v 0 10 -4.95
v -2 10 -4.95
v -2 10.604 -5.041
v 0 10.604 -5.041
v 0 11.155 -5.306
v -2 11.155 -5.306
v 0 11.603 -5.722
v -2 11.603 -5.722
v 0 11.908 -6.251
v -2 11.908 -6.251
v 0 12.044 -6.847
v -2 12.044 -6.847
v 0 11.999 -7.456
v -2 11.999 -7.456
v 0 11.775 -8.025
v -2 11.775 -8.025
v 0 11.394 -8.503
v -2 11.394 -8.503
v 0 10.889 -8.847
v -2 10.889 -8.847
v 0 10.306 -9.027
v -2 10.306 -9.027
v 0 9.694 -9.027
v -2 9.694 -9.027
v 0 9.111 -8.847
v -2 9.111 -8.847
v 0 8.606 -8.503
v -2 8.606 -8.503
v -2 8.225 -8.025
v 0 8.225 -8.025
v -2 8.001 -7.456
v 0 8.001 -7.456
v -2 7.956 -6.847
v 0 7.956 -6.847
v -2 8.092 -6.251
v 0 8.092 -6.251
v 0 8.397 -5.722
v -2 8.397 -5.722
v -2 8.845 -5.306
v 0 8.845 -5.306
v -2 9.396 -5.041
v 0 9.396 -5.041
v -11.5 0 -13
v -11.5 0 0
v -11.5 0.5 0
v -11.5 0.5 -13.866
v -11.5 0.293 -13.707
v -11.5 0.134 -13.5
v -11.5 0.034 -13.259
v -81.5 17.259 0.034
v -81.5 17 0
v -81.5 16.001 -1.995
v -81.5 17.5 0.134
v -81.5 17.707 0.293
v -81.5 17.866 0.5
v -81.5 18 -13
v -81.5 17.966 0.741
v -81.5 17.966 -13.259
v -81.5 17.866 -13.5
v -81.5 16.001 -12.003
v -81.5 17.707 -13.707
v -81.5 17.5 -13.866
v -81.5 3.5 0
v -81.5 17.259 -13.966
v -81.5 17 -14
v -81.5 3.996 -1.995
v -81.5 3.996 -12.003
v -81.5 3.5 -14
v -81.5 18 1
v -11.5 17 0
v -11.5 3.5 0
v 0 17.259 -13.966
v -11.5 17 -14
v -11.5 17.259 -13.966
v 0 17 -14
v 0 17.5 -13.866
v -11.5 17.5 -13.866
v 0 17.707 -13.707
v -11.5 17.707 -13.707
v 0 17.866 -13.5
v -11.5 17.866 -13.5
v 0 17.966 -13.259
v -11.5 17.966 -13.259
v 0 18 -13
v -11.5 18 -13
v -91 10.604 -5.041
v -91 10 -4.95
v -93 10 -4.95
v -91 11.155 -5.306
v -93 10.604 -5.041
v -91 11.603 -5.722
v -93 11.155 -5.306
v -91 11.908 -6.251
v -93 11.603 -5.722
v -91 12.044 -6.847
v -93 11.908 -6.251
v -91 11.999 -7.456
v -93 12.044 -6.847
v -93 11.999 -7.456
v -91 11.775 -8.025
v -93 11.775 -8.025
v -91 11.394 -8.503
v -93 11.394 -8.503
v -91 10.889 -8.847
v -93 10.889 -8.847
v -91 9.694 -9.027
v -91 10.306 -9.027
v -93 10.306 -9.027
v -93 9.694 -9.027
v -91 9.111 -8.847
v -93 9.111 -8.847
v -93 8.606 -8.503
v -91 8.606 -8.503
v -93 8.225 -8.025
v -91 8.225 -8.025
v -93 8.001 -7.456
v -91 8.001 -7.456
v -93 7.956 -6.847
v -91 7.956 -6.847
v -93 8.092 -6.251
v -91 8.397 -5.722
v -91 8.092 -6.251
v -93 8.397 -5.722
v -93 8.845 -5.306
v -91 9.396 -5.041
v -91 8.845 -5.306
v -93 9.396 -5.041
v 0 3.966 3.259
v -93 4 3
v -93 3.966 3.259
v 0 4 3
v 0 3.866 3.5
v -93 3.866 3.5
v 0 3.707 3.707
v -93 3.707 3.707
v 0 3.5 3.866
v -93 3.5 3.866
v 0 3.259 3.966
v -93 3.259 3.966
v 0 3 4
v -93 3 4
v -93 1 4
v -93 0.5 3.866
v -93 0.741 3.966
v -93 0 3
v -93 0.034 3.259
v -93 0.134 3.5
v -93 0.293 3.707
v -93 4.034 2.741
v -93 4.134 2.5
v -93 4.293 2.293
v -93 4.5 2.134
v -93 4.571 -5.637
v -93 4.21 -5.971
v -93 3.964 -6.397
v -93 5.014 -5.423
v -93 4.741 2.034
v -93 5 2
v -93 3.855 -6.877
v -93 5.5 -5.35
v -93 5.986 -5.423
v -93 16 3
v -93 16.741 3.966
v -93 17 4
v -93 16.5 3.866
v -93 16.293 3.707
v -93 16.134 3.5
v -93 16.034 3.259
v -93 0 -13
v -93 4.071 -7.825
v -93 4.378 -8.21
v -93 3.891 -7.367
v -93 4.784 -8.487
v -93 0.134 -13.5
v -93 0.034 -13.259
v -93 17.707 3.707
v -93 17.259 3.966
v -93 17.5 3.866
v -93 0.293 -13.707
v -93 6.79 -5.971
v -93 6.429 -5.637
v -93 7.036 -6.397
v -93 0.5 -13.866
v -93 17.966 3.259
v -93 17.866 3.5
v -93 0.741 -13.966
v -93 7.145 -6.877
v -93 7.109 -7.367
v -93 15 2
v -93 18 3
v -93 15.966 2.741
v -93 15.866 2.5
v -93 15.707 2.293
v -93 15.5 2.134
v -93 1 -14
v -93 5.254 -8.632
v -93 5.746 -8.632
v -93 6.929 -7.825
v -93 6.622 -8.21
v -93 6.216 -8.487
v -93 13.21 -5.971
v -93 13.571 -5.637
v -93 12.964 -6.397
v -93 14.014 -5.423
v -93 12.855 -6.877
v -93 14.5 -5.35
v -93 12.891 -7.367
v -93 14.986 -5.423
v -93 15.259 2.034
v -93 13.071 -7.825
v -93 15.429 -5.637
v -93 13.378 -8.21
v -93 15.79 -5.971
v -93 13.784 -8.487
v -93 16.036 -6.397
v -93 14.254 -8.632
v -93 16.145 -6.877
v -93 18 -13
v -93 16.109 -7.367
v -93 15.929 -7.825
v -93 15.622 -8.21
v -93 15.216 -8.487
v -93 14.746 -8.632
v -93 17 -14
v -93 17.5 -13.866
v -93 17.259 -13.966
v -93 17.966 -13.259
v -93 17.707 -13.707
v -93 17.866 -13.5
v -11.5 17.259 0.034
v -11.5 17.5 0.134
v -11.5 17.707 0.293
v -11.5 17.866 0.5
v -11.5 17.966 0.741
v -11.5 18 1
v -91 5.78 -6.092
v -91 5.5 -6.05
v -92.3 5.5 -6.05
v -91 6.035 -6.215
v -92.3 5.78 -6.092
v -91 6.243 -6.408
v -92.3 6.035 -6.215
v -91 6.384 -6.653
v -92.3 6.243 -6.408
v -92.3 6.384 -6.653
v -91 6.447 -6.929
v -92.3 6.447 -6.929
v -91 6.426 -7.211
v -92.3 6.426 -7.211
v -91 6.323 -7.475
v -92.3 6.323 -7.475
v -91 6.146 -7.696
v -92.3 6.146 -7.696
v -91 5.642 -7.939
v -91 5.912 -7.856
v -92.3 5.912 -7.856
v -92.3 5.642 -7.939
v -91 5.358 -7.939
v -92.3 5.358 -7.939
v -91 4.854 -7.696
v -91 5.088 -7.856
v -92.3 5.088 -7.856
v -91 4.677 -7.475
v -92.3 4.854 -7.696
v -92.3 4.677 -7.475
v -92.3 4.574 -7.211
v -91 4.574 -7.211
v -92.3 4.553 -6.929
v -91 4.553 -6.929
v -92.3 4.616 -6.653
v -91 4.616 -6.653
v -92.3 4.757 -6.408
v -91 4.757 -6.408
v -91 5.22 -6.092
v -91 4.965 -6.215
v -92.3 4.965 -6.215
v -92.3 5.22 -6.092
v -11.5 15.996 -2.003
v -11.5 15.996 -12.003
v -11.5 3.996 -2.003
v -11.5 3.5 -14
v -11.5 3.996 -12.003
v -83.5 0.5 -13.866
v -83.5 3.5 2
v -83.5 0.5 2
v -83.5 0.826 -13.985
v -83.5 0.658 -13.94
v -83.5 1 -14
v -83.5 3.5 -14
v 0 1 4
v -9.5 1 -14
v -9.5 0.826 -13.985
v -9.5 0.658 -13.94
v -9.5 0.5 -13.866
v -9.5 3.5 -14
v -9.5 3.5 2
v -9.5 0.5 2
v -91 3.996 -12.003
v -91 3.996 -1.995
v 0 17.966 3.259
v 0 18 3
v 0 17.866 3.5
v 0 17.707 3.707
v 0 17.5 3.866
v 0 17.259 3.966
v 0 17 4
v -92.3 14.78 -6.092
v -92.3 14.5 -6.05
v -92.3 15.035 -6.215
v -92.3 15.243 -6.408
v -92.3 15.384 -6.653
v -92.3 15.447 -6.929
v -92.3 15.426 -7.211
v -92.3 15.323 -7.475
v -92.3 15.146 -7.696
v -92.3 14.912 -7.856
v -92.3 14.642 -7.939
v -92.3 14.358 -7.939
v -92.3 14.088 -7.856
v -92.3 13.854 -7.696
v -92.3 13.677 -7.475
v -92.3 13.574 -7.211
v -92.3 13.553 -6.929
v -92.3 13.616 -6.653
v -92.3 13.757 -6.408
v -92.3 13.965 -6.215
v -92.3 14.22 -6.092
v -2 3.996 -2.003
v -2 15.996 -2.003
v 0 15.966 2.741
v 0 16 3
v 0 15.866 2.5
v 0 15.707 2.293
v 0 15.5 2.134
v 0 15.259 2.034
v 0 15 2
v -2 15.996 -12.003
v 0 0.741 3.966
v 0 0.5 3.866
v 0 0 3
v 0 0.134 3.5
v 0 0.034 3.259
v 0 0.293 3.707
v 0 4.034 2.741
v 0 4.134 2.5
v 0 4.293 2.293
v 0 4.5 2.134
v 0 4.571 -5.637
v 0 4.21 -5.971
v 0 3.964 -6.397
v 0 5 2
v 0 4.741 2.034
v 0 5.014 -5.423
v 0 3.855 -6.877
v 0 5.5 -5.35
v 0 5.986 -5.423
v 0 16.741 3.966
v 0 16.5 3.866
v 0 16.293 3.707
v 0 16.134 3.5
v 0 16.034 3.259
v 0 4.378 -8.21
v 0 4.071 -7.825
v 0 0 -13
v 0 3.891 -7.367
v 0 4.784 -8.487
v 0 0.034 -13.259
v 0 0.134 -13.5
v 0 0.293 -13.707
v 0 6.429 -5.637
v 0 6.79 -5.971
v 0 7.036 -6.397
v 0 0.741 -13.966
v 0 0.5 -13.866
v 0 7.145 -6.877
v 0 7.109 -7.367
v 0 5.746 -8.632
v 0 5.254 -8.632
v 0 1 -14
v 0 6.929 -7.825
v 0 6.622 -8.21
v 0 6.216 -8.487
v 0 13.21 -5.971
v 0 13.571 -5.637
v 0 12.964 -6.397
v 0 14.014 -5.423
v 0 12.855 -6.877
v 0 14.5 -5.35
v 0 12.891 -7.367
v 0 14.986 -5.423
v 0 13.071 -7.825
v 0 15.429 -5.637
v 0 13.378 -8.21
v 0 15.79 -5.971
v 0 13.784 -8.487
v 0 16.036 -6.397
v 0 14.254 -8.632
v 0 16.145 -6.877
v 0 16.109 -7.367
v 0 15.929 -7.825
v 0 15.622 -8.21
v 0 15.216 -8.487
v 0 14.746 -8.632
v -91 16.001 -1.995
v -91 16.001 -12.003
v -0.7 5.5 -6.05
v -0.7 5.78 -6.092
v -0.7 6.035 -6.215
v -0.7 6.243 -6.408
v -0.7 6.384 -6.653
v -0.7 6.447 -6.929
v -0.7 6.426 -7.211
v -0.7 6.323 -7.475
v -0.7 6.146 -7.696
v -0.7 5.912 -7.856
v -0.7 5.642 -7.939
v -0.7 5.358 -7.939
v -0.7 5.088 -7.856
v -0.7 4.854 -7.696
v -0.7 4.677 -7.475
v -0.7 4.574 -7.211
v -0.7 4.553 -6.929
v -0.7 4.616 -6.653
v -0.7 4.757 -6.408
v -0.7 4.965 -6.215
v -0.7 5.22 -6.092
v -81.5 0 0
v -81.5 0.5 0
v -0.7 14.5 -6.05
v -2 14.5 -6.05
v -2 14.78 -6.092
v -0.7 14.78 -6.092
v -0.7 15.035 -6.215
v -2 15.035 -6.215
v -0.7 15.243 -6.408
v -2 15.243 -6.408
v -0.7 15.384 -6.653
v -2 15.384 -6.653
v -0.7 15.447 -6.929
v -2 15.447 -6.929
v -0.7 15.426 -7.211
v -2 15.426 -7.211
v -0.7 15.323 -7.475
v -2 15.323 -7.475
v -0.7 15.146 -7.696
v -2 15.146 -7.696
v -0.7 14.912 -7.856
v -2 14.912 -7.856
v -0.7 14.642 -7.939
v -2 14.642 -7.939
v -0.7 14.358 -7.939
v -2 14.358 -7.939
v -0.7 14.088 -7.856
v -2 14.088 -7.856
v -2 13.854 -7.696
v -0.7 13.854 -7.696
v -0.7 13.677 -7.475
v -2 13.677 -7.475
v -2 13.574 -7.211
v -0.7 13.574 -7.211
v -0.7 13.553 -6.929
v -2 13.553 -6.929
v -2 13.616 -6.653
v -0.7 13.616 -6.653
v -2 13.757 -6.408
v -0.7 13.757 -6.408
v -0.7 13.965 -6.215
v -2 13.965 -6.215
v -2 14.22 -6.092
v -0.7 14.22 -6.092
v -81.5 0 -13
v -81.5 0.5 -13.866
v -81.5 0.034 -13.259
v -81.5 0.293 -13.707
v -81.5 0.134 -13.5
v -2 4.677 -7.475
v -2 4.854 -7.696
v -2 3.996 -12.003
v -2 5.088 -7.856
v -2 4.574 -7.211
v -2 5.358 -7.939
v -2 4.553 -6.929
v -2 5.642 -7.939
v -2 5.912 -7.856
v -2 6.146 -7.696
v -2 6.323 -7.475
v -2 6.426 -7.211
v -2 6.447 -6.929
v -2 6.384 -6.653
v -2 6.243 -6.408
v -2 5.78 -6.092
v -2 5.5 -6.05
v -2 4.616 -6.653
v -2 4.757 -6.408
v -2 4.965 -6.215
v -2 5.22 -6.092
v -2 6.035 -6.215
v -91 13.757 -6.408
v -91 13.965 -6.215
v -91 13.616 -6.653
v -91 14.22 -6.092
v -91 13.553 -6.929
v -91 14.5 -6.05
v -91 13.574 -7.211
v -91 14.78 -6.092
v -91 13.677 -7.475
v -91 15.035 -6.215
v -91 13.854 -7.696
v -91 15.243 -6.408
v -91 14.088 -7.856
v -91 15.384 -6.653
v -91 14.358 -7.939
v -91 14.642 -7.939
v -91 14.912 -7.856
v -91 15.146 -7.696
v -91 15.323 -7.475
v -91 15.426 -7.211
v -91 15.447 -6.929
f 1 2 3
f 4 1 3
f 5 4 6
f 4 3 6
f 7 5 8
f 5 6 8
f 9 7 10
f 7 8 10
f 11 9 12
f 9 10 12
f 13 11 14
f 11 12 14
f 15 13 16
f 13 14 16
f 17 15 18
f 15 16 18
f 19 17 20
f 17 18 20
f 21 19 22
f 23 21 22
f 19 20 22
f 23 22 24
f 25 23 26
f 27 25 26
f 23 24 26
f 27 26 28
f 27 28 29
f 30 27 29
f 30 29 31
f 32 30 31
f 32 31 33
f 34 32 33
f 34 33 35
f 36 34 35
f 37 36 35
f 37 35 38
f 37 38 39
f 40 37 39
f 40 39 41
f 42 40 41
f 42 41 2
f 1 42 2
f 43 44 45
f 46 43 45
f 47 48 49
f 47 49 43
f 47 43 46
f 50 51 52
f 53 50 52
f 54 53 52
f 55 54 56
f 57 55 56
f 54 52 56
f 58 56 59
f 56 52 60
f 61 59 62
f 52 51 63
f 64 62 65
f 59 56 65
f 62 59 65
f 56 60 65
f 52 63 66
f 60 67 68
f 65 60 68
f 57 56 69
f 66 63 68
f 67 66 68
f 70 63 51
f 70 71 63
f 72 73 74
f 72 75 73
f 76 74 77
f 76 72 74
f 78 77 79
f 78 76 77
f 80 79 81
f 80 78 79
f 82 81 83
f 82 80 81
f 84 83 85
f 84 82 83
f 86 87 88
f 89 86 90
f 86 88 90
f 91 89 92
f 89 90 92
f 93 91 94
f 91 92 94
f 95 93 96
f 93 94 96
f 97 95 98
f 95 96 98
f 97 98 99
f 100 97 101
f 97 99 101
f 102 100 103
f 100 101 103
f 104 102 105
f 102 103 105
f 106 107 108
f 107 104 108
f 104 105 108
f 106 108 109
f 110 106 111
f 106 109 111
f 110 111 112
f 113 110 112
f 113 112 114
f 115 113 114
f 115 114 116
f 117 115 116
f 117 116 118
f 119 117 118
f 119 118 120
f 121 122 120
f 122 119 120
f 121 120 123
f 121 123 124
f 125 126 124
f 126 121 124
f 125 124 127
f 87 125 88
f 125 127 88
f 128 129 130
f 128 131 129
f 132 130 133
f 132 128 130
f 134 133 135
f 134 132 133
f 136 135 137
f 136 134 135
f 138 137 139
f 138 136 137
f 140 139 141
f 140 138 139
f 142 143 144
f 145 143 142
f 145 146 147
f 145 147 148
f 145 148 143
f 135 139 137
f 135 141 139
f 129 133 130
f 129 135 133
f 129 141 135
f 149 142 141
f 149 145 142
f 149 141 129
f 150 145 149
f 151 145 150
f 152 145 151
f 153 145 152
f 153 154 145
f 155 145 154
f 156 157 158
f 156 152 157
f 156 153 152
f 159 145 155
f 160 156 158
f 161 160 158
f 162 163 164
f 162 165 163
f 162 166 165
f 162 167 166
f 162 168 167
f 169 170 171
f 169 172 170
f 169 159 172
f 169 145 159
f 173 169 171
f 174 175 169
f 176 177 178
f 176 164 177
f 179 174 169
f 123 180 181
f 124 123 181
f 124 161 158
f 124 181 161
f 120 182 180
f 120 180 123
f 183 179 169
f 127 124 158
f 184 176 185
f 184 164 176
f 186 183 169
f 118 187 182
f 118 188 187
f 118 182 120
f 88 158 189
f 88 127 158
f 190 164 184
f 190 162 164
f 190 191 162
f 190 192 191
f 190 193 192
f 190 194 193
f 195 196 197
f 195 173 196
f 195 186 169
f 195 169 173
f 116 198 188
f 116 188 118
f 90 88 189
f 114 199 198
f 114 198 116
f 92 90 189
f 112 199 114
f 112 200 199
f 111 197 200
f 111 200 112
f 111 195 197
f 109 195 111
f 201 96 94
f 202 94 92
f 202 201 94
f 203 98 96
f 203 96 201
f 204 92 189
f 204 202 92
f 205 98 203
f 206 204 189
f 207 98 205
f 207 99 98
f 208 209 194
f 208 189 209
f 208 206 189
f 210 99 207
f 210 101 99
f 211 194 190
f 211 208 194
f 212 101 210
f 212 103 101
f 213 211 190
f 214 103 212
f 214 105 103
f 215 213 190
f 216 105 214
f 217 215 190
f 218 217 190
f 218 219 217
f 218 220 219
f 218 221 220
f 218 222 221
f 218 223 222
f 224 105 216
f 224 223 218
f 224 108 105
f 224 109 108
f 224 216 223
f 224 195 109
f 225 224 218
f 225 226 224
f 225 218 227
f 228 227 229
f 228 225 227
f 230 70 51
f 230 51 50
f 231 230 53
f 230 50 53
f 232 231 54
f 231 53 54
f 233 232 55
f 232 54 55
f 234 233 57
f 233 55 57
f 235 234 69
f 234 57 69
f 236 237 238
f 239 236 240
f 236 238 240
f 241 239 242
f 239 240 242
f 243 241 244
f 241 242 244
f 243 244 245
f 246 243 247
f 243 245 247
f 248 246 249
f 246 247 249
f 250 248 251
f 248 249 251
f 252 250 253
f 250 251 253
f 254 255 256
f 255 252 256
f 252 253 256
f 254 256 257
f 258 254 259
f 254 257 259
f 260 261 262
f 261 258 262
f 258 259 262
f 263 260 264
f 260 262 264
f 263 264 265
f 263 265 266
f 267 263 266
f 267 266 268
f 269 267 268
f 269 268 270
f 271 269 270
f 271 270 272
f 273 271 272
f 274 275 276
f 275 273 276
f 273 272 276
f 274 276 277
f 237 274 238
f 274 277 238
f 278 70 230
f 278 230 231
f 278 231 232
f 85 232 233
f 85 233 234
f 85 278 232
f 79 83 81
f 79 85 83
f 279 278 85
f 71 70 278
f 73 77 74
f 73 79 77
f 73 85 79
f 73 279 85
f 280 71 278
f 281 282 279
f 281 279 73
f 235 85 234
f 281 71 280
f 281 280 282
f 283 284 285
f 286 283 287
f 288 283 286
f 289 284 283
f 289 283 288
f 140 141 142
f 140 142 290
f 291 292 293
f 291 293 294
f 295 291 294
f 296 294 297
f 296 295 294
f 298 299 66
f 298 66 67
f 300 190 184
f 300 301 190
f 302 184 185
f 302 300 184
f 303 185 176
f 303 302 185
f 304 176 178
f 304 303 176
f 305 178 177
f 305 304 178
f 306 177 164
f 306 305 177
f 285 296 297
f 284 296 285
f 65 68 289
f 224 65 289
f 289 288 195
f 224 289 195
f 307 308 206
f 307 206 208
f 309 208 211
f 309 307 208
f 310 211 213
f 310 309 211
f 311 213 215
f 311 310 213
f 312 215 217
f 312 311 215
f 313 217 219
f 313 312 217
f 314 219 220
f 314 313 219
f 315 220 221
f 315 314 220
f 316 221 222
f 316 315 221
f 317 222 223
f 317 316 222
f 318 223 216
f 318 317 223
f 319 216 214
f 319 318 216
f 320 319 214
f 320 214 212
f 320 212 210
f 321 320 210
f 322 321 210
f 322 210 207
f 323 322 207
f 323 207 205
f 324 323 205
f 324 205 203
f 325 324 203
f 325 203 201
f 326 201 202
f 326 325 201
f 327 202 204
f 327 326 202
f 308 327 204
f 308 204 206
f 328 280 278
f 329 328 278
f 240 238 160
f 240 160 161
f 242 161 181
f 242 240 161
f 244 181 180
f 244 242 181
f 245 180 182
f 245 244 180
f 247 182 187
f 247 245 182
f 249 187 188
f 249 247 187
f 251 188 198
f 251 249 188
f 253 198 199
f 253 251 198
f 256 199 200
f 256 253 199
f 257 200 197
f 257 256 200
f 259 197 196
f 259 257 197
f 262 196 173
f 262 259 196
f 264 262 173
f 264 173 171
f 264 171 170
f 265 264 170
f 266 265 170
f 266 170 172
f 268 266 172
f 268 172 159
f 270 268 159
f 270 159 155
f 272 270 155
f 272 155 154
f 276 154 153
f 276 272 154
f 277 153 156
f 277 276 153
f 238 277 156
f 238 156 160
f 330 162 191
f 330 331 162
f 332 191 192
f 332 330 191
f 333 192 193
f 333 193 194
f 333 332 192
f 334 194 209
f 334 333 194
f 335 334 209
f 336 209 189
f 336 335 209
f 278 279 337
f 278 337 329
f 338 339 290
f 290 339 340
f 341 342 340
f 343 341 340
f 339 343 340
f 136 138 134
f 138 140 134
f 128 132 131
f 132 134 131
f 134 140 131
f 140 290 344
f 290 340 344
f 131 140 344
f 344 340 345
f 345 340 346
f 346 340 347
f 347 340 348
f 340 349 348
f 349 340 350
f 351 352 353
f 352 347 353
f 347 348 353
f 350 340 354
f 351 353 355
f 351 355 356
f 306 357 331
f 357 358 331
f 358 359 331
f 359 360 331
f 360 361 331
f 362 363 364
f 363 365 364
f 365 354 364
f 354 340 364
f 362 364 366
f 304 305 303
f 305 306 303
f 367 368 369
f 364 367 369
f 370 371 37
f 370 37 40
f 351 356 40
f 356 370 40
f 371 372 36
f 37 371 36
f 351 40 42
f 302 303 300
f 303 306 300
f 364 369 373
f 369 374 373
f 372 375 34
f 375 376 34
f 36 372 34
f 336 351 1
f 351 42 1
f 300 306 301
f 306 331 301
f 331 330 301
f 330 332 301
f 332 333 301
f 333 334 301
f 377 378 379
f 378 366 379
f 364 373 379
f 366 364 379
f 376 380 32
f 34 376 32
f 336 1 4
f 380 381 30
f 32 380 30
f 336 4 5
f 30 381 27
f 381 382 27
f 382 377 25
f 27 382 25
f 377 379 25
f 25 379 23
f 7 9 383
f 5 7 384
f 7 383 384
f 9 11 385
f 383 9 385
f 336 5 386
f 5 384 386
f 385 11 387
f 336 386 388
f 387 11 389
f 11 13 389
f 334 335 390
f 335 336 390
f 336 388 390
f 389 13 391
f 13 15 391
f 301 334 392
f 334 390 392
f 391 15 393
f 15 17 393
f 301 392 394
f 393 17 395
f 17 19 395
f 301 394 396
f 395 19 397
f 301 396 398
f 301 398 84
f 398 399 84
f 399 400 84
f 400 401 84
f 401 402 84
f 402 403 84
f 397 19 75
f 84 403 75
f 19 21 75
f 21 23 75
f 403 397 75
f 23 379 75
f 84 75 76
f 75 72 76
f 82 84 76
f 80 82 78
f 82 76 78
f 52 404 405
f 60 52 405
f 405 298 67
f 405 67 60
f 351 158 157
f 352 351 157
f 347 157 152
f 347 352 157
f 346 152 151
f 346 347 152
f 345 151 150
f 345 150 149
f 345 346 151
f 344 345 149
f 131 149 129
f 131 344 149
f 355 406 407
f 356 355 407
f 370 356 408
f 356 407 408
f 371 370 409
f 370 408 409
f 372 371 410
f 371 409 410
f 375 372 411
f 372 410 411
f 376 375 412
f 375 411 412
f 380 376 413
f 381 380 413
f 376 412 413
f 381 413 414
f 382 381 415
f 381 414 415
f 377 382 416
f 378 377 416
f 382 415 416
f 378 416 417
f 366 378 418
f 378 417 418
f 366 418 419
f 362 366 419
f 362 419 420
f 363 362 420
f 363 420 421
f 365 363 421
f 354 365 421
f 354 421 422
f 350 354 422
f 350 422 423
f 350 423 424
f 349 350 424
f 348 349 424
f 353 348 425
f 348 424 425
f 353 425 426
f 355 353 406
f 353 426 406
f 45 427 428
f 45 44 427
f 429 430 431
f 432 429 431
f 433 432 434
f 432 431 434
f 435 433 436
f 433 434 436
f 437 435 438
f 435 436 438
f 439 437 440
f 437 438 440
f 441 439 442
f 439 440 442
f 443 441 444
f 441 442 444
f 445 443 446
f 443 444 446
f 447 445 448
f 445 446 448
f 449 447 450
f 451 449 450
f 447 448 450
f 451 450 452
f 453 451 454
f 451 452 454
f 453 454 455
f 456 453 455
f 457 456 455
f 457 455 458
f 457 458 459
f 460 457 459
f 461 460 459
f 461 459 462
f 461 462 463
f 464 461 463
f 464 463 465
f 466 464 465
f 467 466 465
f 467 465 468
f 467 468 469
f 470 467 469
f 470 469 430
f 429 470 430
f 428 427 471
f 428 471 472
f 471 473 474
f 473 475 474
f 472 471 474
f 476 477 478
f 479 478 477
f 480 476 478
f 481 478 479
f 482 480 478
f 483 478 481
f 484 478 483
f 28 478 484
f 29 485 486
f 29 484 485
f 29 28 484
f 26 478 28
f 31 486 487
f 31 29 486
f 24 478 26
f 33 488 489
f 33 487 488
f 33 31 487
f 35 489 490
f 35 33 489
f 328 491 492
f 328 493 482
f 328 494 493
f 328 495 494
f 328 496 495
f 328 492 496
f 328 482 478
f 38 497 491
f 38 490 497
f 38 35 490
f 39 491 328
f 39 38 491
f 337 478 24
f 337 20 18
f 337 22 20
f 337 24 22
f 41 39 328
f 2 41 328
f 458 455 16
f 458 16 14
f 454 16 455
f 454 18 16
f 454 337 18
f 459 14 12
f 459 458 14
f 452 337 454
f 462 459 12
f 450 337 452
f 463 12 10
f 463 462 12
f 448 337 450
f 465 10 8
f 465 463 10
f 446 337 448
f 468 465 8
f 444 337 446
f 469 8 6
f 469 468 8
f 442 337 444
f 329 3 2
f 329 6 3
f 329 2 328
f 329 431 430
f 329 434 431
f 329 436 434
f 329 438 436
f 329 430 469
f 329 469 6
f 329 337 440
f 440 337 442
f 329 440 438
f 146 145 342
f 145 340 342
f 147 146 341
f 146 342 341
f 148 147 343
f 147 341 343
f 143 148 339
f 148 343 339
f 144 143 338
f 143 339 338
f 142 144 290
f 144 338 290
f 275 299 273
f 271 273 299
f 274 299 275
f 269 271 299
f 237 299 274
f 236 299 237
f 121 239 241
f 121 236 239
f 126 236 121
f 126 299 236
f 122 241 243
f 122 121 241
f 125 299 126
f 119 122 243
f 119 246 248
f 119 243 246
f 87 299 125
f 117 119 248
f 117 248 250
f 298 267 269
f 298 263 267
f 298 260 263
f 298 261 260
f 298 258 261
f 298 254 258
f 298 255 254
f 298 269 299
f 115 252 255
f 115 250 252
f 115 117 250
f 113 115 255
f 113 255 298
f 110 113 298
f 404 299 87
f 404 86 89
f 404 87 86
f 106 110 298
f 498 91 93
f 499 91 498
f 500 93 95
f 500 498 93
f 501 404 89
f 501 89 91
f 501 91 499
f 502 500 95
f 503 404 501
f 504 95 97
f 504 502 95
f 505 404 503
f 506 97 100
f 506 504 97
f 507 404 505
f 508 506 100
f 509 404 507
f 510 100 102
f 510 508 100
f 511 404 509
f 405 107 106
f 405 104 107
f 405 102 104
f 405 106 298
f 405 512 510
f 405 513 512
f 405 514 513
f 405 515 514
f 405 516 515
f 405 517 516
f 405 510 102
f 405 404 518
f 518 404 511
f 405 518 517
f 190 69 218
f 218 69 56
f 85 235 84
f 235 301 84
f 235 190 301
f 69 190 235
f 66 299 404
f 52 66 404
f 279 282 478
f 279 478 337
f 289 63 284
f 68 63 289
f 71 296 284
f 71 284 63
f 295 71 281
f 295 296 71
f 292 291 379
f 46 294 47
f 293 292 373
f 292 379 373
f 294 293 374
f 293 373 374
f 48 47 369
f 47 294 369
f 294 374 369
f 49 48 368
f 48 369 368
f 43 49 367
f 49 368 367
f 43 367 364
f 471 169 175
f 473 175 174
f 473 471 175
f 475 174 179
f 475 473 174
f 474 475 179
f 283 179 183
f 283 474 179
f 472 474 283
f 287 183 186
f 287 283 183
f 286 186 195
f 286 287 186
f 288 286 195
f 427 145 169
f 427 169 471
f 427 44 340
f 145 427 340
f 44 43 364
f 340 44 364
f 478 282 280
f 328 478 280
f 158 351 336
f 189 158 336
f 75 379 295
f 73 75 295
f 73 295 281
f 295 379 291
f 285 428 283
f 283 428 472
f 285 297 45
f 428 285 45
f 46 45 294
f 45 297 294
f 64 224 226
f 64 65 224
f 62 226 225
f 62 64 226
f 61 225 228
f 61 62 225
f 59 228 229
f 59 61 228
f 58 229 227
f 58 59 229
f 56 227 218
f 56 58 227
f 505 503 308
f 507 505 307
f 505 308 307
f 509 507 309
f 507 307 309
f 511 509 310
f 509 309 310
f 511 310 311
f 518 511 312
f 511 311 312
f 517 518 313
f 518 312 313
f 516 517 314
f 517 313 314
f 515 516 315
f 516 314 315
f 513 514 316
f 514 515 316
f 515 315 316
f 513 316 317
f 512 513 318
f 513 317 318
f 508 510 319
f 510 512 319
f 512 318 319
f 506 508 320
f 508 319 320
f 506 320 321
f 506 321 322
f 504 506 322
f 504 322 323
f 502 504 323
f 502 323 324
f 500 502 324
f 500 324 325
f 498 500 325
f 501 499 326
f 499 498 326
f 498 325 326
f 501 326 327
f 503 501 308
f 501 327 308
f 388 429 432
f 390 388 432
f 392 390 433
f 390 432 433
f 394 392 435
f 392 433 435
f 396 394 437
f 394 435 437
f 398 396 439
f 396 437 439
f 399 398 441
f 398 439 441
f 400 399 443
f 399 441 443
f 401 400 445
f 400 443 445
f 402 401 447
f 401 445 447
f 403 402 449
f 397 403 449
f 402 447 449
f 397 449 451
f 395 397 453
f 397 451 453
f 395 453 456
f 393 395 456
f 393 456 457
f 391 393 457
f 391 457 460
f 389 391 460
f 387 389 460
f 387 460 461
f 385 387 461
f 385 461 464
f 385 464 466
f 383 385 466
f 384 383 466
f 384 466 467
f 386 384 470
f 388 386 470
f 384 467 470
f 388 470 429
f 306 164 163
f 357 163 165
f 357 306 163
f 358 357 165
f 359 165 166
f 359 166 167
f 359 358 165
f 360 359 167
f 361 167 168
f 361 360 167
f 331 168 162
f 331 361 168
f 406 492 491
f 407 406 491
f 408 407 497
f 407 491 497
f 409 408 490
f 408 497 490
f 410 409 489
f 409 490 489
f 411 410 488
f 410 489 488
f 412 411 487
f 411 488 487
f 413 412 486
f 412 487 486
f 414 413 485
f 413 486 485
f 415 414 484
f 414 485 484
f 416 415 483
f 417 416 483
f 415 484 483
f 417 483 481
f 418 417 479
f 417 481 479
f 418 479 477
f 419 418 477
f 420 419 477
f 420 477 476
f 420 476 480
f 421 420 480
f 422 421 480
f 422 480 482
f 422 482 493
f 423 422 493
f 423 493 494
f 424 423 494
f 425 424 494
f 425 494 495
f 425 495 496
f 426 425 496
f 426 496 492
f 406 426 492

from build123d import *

# Parameters (mm, degrees)
BOSS_EXTRUDE1_DEPTH = 2
SKETCH2_5_W         = 11.5
SKETCH2_5_H         = 14
BOSS_EXTRUDE3_DEPTH = 18
SKETCH3_R           = 2.05
SKETCH3_R_2         = 0.95
CUT_EXTRUDE2_DEPTH  = 96.754895436
CUT_EXTRUDE3_START  = -9.5
SKETCH5_W           = 10.007299984
SKETCH5_H           = 12.005127567
SKETCH5_R           = 0.95
SKETCH5_R_2         = 2.05
CUT_EXTRUDE3_DEPTH  = 9.5
SKETCH6_W           = 10
SKETCH6_H           = 12
SKETCH6_R           = 0.95
SKETCH6_R_2         = 2.05
CUT_EXTRUDE4_DEPTH  = 9.5
CHAMFER1_SIZE       = 0.7
SKETCH11_W          = 2
SKETCH11_H          = 18
BOSS_EXTRUDE6_DEPTH = 93
SKETCH12_W          = 93
SKETCH12_H          = 4
SKETCH12_H_2        = 2
BOSS_EXTRUDE7_DEPTH = 2
SKETCH14_W          = 70
SKETCH14_H          = 14
CUT_EXTRUDE6_DEPTH  = 2
SKETCH16_W          = 70
SKETCH16_H          = 3
CUT_EXTRUDE7_DEPTH  = 2
SKETCH17_W          = 16
SKETCH17_H          = 3
CUT_EXTRUDE8_DEPTH  = 2
SKETCH18_W          = 16
SKETCH18_H          = 3
CUT_EXTRUDE9_DEPTH  = 2
FILLET4_R           = 1


with BuildPart() as part:
    # Sketch2 → Boss-Extrude1 (new body)
    with BuildSketch(Plane(origin=(0, 0, 0), x_dir=(1, 0, 0), z_dir=(0, 1, 0))):
        Polygon((-11.5, 0), (-81.5, 0), (-93, 0), (-93, 14), (-81.5, 14), (-11.5, 14), (0, 14), (0, 0), align=None)
    extrude(amount=BOSS_EXTRUDE1_DEPTH)

    # Sketch2<5> → Boss-Extrude3 (add)
    with BuildSketch(Plane(origin=(0, 0, 0), x_dir=(1, 0, 0), z_dir=(0, 1, 0))):
        with Locations((-87.25, 7)):
            Rectangle(SKETCH2_5_W, SKETCH2_5_H)
        with Locations((-5.75, 7)):
            Rectangle(SKETCH2_5_W, SKETCH2_5_H)
    extrude(amount=BOSS_EXTRUDE3_DEPTH)

    # Sketch3 → Cut-Extrude2 (cut, through all)
    with BuildSketch(Plane.ZY.offset(93)):
        with Locations((-7, 10)):
            Circle(SKETCH3_R)
        with Locations((-7, 14.5)):
            Circle(SKETCH3_R_2)
        with Locations((-7, 5.5)):
            Circle(SKETCH3_R_2)
    extrude(amount=-CUT_EXTRUDE2_DEPTH, mode=Mode.SUBTRACT)

    # Sketch5 → Cut-Extrude3 (cut)
    with BuildSketch(Plane(origin=(-81.5, 0, 0), x_dir=(0, 0, -1), z_dir=(1, 0, 0)).offset(CUT_EXTRUDE3_START)):
        with Locations((6.99901027, 9.998913792)):
            Rectangle(SKETCH5_W, SKETCH5_H)
        with Locations(Location((7, 14.5, 0), (0, 0, 180))):
            Circle(SKETCH5_R, mode=Mode.SUBTRACT)
        with Locations(Location((7, 5.5, 0), (0, 0, 180))):
            Circle(SKETCH5_R, mode=Mode.SUBTRACT)
        with Locations(Location((7, 10, 0), (0, 0, 180))):
            Circle(SKETCH5_R_2, mode=Mode.SUBTRACT)
    extrude(amount=CUT_EXTRUDE3_DEPTH, mode=Mode.SUBTRACT)

    # Sketch6 → Cut-Extrude4 (cut)
    with BuildSketch(Plane.ZY.offset(11.5)):
        with Locations((-7.002660262, 9.996350008)):
            Rectangle(SKETCH6_W, SKETCH6_H)
        with Locations((-7, 14.5)):
            Circle(SKETCH6_R, mode=Mode.SUBTRACT)
        with Locations((-7, 5.5)):
            Circle(SKETCH6_R, mode=Mode.SUBTRACT)
        with Locations((-7, 10)):
            Circle(SKETCH6_R_2, mode=Mode.SUBTRACT)
    extrude(amount=-CUT_EXTRUDE4_DEPTH, mode=Mode.SUBTRACT)

    # Chamfer1
    chamfer1_edges = [part.edges().sort_by_distance(p)[0] for p in [
        (0, 14.5, -7.95),
        (-93, 14.5, -7.95),
        (0, 5.5, -7.95),
        (-93, 5.5, -7.95),
    ]]
    chamfer(chamfer1_edges, length=CHAMFER1_SIZE)

    # Sketch11 → Boss-Extrude6 (add)
    with BuildSketch(Plane(origin=(0, 0, 0), x_dir=(0, 0, -1), z_dir=(1, 0, 0))):
        with Locations((-1, 9)):
            Rectangle(SKETCH11_W, SKETCH11_H)
    extrude(amount=-BOSS_EXTRUDE6_DEPTH)

    # Sketch12 → Boss-Extrude7 (add)
    with BuildSketch(Plane.XY.offset(2)):
        with Locations((-46.5, 2)):
            Rectangle(SKETCH12_W, SKETCH12_H)
        with Locations((-46.5, 17)):
            Rectangle(SKETCH12_W, SKETCH12_H_2)
    extrude(amount=BOSS_EXTRUDE7_DEPTH)

    # Sketch14 → Cut-Extrude6 (cut)
    with BuildSketch(Plane(origin=(0, 2, 0), x_dir=(1, 0, 0), z_dir=(0, 1, 0))):
        with Locations((-46.5, 7)):
            Rectangle(SKETCH14_W, SKETCH14_H)
    extrude(amount=-CUT_EXTRUDE6_DEPTH, mode=Mode.SUBTRACT)

    # Sketch16 → Cut-Extrude7 (cut)
    with BuildSketch(Plane(origin=(0, 0, 0), x_dir=(-1, 0, 0), z_dir=(0, 0, -1))):
        with Locations((46.5, 2)):
            Rectangle(SKETCH16_W, SKETCH16_H)
    extrude(amount=-CUT_EXTRUDE7_DEPTH, mode=Mode.SUBTRACT)

    # Sketch17 → Cut-Extrude8 (cut)
    with BuildSketch(Plane(origin=(-81.5, 0, 0), x_dir=(0, 0, -1), z_dir=(1, 0, 0))):
        with Locations((6, 2)):
            Rectangle(SKETCH17_W, SKETCH17_H)
    extrude(amount=-CUT_EXTRUDE8_DEPTH, mode=Mode.SUBTRACT)

    # Sketch18 → Cut-Extrude9 (cut)
    with BuildSketch(Plane.ZY.offset(11.5)):
        with Locations((-6, 2)):
            Rectangle(SKETCH18_W, SKETCH18_H)
    extrude(amount=-CUT_EXTRUDE9_DEPTH, mode=Mode.SUBTRACT)

    # Fillet4
    fillet4_edges = [part.edges().sort_by_distance(p)[0] for p in [
        (-46.5, 18, 0),
        (-46.5, 4, 2),
        (-46.5, 0, 4),
        (-46.5, 4, 4),
        (-46.5, 16, 2),
        (-46.5, 18, 4),
        (-87.25, 0, -14),
        (-87.25, 18, -14),
        (-5.75, 18, -14),
        (-5.75, 0, -14),
        (-46.5, 16, 4),
    ]]
    fillet(fillet4_edges, radius=FILLET4_R - 0.0001)  # a hair under: the kernel refuses the full size


solid = part.part
